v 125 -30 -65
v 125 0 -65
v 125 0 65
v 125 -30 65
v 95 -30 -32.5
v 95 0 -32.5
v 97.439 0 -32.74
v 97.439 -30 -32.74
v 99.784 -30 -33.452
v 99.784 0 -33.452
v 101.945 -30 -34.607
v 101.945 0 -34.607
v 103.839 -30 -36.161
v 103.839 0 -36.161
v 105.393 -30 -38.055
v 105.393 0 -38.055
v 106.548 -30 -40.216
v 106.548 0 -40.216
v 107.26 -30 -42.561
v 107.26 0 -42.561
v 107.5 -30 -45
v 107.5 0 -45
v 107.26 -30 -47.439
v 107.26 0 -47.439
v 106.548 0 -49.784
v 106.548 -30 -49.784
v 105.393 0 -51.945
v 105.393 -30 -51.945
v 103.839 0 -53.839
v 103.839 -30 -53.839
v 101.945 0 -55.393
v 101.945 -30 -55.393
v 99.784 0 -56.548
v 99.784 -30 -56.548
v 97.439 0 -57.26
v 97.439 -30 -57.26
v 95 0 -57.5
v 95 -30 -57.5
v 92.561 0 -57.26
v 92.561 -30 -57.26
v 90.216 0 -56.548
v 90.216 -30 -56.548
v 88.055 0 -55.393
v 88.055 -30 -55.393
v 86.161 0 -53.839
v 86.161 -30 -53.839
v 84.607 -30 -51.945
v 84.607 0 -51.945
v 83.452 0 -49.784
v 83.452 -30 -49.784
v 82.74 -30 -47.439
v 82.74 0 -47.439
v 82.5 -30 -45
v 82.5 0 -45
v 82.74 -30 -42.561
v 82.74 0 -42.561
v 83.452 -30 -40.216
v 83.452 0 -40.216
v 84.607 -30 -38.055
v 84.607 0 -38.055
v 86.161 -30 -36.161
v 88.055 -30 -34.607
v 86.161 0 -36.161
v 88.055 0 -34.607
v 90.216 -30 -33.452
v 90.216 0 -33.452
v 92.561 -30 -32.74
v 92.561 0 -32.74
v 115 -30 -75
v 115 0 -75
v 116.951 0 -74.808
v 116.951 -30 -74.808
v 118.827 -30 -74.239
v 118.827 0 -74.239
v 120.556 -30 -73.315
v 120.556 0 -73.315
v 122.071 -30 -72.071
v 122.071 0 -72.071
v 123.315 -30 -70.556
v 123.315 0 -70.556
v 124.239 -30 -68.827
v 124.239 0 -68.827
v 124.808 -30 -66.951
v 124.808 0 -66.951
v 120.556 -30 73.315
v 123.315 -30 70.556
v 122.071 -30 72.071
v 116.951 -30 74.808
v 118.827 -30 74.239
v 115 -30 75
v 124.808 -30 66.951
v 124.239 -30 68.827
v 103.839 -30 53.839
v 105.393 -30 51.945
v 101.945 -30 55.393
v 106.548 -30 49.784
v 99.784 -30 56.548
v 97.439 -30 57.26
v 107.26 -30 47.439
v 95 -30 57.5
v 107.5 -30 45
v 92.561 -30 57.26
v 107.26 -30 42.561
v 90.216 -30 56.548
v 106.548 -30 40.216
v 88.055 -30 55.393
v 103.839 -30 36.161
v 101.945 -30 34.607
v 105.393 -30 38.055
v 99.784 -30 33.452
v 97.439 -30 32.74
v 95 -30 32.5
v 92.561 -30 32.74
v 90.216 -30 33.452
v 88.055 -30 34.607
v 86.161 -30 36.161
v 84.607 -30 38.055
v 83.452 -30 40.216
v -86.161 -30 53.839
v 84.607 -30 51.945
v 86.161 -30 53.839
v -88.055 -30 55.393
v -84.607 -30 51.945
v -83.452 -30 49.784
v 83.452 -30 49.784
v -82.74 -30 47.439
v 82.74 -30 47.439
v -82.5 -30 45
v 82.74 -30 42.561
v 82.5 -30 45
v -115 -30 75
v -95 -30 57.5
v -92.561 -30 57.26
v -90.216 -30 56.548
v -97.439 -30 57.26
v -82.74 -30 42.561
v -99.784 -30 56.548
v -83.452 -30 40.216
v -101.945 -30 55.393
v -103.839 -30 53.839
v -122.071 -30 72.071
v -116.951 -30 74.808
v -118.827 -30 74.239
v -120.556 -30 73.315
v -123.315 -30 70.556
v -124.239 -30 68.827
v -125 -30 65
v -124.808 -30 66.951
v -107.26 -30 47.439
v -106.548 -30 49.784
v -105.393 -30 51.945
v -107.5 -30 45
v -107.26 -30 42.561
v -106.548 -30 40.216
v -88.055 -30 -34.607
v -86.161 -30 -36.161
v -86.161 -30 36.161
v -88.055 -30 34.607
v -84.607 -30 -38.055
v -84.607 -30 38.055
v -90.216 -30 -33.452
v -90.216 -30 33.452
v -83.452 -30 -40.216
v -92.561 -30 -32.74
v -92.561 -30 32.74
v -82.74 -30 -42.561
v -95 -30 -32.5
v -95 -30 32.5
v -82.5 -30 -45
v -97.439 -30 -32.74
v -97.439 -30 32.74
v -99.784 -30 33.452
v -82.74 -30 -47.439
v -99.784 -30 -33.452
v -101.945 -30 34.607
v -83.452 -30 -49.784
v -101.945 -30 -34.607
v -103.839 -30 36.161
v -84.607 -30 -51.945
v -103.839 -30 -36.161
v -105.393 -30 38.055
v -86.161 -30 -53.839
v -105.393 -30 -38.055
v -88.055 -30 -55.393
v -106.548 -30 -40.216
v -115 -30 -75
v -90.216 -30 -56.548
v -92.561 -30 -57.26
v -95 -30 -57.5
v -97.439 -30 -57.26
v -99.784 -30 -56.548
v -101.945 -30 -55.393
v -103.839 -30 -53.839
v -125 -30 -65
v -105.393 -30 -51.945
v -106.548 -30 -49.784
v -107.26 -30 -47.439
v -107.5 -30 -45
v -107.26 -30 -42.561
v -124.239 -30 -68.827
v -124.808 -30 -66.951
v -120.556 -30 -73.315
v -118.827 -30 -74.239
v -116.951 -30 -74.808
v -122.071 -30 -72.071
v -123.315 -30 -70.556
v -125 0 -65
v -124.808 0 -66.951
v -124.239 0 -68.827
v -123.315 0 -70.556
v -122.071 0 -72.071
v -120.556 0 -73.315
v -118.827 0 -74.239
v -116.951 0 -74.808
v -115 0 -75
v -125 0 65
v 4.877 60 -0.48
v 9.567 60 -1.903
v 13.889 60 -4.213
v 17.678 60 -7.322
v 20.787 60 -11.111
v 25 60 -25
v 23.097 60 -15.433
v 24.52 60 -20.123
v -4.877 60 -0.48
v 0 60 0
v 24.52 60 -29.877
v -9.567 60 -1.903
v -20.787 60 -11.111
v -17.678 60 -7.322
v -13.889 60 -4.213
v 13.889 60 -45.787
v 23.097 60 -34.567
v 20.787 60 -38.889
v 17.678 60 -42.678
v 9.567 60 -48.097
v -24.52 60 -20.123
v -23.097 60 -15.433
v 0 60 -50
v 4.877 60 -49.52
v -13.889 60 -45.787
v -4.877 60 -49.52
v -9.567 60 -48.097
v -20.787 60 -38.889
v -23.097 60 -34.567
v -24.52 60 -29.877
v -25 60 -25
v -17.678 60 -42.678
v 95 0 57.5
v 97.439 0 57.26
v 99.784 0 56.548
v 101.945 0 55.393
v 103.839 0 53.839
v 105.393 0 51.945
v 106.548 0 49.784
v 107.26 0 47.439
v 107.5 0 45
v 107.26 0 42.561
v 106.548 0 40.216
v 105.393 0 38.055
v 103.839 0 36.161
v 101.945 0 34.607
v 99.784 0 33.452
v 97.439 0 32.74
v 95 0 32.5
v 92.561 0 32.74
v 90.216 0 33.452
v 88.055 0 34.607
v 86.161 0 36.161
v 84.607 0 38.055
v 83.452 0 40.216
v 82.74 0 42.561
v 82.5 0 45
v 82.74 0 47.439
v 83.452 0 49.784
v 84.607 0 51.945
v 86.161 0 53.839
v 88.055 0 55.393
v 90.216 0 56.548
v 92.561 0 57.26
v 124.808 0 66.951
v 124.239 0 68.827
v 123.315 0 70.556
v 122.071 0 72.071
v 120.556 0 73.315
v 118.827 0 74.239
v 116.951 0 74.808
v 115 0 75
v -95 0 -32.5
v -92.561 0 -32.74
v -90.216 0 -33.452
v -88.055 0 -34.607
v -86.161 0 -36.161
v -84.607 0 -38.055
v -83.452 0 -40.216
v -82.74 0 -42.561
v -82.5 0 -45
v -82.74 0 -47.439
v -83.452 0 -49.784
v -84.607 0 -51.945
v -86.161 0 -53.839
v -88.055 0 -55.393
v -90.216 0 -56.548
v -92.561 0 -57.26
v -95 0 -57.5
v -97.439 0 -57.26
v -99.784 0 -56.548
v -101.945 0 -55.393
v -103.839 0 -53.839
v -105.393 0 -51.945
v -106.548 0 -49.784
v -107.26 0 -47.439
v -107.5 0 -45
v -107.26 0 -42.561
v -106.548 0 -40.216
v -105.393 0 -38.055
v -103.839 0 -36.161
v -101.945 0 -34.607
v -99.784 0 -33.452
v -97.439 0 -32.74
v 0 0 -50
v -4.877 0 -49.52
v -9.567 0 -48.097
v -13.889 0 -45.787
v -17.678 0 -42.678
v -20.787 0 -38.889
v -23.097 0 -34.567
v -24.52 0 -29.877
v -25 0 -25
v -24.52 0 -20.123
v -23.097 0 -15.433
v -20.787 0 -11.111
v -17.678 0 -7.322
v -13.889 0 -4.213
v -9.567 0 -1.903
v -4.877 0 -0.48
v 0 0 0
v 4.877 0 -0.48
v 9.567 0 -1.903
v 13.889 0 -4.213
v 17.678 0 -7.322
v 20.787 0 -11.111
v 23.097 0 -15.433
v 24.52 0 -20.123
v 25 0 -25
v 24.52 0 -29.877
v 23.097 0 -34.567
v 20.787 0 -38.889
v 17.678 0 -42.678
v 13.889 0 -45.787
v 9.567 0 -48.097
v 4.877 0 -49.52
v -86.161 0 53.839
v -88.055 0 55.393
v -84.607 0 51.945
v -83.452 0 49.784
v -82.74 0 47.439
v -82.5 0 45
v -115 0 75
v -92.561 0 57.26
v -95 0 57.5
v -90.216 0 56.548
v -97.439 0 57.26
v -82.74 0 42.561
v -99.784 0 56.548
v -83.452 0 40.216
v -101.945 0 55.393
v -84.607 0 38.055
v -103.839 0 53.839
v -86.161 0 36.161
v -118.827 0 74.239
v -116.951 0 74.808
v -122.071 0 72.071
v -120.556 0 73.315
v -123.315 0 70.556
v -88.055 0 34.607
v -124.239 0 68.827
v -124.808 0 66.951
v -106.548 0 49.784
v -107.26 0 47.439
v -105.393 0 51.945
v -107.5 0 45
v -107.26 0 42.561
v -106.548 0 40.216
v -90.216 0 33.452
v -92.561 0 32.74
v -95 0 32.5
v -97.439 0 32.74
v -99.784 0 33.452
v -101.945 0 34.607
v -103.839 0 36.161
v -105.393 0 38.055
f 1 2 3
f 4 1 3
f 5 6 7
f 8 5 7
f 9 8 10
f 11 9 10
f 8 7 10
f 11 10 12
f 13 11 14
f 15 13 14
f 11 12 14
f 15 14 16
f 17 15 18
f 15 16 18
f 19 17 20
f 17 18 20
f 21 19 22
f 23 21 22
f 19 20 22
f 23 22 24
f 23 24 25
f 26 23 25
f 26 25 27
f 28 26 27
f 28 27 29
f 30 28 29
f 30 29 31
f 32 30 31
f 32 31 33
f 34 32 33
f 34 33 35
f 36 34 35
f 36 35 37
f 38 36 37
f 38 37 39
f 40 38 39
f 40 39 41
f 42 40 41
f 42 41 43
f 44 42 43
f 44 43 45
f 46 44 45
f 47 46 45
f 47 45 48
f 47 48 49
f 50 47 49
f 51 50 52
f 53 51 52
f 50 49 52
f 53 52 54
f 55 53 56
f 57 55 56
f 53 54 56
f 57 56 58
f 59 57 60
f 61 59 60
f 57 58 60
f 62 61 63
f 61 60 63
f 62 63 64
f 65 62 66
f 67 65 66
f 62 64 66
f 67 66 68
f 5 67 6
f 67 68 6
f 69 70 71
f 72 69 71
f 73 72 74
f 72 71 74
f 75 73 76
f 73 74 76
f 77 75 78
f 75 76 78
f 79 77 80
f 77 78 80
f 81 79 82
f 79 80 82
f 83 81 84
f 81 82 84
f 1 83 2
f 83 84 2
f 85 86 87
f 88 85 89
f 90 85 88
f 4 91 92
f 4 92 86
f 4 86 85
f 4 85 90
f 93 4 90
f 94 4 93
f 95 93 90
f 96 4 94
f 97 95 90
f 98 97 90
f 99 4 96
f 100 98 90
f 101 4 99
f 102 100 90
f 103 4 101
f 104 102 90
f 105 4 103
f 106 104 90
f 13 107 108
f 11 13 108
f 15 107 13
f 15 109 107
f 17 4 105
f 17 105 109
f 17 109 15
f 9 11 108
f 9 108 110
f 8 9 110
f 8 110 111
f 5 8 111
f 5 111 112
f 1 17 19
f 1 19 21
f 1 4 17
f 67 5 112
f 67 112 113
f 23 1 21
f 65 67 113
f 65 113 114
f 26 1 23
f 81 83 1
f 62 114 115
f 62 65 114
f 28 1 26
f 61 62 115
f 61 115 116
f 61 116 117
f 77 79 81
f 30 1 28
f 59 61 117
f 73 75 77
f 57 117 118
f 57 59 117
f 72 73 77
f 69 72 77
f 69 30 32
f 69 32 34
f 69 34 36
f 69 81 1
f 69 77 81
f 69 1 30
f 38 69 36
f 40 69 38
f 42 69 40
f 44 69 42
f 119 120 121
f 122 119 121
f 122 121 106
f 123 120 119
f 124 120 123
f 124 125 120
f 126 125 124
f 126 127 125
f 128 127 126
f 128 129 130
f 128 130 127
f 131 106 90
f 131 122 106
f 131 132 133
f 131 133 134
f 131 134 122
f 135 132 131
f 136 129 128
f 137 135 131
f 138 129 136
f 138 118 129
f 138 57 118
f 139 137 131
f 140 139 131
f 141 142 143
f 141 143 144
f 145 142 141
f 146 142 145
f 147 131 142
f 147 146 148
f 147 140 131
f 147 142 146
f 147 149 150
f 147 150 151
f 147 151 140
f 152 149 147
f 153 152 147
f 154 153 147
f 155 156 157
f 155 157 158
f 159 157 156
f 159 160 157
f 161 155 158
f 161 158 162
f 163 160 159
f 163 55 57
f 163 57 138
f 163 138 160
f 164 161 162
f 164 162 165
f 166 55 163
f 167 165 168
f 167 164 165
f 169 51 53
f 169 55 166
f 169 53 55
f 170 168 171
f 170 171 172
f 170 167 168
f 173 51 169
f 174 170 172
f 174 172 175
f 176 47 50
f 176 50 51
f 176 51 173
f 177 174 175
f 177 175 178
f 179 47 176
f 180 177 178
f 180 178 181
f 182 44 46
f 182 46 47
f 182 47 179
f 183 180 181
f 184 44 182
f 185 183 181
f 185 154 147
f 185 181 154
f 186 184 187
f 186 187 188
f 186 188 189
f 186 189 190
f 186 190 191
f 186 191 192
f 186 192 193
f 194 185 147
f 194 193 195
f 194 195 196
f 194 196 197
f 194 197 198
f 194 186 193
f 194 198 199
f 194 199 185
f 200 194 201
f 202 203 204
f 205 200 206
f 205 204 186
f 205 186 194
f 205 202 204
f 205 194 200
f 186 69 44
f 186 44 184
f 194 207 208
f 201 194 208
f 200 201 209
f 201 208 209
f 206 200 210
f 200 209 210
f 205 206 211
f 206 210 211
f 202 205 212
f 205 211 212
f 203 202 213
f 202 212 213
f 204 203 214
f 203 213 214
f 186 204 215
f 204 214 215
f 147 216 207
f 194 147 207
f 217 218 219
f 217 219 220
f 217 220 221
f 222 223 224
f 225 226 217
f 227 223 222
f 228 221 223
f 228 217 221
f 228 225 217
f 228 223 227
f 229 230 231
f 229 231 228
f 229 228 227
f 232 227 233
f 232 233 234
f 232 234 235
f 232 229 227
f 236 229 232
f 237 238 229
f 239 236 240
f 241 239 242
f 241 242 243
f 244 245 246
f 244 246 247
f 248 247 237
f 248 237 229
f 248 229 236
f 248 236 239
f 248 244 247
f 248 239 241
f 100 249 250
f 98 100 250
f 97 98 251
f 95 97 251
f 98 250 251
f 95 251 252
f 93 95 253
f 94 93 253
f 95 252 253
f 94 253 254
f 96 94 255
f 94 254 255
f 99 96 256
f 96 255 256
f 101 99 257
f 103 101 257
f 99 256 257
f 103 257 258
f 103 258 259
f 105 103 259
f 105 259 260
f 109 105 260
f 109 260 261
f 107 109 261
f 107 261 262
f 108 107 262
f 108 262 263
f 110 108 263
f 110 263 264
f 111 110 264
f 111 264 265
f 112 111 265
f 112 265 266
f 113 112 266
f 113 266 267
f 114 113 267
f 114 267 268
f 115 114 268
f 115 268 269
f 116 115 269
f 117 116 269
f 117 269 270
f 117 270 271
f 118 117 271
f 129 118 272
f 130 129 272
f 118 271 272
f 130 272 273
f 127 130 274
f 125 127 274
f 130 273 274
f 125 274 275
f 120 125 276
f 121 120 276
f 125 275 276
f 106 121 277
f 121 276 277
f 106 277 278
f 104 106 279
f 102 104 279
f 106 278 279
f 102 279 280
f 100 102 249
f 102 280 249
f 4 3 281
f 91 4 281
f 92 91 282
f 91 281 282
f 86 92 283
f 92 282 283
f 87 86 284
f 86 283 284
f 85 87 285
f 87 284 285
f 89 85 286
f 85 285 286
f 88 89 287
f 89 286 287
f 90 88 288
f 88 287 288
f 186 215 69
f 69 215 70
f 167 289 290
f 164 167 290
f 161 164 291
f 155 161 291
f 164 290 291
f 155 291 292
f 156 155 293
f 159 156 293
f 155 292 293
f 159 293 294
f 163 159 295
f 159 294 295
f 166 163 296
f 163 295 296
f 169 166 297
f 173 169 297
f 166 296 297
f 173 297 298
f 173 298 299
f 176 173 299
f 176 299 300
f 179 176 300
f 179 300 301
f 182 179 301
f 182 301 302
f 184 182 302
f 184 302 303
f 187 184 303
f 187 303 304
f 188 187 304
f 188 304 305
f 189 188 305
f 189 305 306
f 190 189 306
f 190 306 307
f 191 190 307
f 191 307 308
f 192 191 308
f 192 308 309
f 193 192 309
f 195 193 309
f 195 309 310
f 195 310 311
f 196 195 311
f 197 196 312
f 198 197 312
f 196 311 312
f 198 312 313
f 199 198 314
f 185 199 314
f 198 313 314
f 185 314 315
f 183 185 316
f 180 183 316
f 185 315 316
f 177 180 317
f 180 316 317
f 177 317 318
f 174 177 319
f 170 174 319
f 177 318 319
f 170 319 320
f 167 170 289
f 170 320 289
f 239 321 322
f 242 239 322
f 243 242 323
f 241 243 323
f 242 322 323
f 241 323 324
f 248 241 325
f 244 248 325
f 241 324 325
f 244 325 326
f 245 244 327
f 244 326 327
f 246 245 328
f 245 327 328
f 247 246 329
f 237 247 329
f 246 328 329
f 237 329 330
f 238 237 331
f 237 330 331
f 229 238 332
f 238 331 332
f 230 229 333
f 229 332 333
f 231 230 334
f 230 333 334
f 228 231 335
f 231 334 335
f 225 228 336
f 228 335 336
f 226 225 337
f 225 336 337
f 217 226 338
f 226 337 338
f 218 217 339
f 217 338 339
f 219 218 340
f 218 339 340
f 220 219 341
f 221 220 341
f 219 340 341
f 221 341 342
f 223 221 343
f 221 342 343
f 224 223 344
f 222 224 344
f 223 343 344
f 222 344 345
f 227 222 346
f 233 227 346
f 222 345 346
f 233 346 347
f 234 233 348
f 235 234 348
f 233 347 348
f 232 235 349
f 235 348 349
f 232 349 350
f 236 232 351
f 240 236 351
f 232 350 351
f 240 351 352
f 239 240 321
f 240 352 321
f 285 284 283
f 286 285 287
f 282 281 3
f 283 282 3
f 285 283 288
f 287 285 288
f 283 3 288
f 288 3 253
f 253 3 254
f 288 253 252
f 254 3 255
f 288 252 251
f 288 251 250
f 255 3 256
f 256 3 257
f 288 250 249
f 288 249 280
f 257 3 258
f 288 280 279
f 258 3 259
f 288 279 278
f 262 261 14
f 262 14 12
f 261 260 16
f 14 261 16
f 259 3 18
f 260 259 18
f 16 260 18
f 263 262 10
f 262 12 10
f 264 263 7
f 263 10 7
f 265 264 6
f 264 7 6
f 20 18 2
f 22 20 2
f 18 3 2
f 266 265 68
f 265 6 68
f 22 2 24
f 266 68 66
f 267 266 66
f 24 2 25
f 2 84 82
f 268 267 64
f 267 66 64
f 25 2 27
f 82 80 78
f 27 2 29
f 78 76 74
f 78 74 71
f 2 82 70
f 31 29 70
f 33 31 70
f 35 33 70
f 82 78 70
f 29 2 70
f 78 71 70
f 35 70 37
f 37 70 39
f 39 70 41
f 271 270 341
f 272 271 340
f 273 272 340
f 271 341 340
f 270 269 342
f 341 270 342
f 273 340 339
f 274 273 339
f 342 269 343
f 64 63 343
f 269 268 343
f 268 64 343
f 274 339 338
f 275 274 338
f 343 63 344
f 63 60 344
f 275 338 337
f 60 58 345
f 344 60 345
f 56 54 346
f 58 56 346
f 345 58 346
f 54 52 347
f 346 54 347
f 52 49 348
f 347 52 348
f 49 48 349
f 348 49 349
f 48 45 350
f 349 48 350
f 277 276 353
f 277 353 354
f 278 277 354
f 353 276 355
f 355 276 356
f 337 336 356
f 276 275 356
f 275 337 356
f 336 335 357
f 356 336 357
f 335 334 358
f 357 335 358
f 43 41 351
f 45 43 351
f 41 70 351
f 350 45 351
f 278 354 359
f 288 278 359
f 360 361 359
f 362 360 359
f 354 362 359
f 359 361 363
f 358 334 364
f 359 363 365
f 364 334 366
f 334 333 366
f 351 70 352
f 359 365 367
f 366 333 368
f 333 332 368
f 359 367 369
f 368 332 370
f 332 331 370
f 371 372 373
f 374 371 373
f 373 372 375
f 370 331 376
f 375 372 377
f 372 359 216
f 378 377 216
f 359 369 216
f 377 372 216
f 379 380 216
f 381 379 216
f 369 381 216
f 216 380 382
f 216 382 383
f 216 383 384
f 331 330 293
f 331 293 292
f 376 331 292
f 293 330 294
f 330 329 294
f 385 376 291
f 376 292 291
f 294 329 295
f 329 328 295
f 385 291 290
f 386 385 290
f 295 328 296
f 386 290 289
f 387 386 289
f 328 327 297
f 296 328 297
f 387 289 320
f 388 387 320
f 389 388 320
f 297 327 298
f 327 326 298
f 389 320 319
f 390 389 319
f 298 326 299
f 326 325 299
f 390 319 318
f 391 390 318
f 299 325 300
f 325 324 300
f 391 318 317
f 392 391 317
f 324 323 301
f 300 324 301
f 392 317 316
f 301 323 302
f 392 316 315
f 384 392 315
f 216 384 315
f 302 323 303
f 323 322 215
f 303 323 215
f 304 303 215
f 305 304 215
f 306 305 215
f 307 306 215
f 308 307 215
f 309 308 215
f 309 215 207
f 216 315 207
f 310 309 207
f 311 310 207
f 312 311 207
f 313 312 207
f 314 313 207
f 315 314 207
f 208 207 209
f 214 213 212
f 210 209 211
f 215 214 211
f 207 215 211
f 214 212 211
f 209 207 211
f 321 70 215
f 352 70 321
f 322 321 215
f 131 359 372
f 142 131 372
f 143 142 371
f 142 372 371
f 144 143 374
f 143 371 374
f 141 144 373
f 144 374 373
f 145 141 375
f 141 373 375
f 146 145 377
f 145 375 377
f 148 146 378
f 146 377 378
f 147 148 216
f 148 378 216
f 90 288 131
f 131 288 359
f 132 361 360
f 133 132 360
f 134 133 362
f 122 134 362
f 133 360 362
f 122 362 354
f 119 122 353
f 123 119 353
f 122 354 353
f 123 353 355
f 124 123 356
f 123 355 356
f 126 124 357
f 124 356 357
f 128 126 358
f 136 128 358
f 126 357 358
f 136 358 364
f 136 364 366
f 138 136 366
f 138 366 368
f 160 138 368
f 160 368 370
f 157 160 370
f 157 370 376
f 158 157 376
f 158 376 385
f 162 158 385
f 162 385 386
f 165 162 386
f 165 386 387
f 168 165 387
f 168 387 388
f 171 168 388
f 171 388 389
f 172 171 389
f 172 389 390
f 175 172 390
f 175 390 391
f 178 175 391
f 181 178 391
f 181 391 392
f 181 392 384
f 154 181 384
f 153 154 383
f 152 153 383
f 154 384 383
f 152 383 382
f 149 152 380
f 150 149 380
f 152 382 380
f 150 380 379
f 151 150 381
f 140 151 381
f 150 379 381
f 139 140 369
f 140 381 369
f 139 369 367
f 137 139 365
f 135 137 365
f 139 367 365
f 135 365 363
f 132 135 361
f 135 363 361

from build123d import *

# Parameters (mm, degrees)
Y_KSEKLIK_EKSTR_ZYON1_DEPTH = 30
IZIM2_R                     = 25
Y_KSEKLIK_EKSTR_ZYON2_DEPTH = 60
IZIM3_R                     = 12.5
KES_EKSTR_ZYON1_DEPTH       = 158.638827704
L_O_ALTMA2_COUNT            = 2
L_O_ALTMA2_PITCH            = 190
L_O_ALTMA2_COUNT_DIR2       = 2
L_O_ALTMA2_PITCH_DIR2       = 90


with BuildPart() as part:
    # Çizim1 → Yükseklik-Ekstrüzyon1 (new body)
    with BuildSketch(Plane(origin=(0, 0, 0), x_dir=(1, 0, 0), z_dir=(0, 1, 0))):
        with BuildLine():
            Line((-115, 75), (115, 75))
            ThreePointArc((115, 75), (122.071067812, 72.071067812), (125, 65))
            Line((125, 65), (125, -65))
            ThreePointArc((125, -65), (122.071067812, -72.071067812), (115, -75))
            Line((115, -75), (-115, -75))
            ThreePointArc((-115, -75), (-122.071067812, -72.071067812), (-125, -65))
            Line((-125, -65), (-125, 65))
            ThreePointArc((-125, 65), (-122.071067812, 72.071067812), (-115, 75))
        make_face()
    extrude(amount=-Y_KSEKLIK_EKSTR_ZYON1_DEPTH)

    # Çizim2 → Yükseklik-Ekstrüzyon2 (add)
    with BuildSketch(Plane(origin=(0, 0, 0), x_dir=(1, 0, 0), z_dir=(0, 1, 0))):
        with Locations(Location((0, 25, 0), (0, 0, 90))):
            Circle(IZIM2_R)
    extrude(amount=Y_KSEKLIK_EKSTR_ZYON2_DEPTH)

    # Çizim3 → Kes-Ekstrüzyon1 (cut, through all)
    with BuildSketch(Plane(origin=(0, 0, 0), x_dir=(1, 0, 0), z_dir=(0, 1, 0))):
        with Locations(Location((-95, 45, 0), (0, 0, 270))):
            Circle(IZIM3_R)
    kes_ekstr_zyon1 = extrude(amount=-KES_EKSTR_ZYON1_DEPTH, mode=Mode.SUBTRACT)

    # LÇoğaltma2: Kes-Ekstr_zyon1 2 × 2
    with Locations(*[(i * L_O_ALTMA2_PITCH, 0, j * L_O_ALTMA2_PITCH_DIR2) for i in range(L_O_ALTMA2_COUNT) for j in range(L_O_ALTMA2_COUNT_DIR2) if (i, j) != (0, 0)]):
        add(kes_ekstr_zyon1, mode=Mode.SUBTRACT)


solid = part.part
